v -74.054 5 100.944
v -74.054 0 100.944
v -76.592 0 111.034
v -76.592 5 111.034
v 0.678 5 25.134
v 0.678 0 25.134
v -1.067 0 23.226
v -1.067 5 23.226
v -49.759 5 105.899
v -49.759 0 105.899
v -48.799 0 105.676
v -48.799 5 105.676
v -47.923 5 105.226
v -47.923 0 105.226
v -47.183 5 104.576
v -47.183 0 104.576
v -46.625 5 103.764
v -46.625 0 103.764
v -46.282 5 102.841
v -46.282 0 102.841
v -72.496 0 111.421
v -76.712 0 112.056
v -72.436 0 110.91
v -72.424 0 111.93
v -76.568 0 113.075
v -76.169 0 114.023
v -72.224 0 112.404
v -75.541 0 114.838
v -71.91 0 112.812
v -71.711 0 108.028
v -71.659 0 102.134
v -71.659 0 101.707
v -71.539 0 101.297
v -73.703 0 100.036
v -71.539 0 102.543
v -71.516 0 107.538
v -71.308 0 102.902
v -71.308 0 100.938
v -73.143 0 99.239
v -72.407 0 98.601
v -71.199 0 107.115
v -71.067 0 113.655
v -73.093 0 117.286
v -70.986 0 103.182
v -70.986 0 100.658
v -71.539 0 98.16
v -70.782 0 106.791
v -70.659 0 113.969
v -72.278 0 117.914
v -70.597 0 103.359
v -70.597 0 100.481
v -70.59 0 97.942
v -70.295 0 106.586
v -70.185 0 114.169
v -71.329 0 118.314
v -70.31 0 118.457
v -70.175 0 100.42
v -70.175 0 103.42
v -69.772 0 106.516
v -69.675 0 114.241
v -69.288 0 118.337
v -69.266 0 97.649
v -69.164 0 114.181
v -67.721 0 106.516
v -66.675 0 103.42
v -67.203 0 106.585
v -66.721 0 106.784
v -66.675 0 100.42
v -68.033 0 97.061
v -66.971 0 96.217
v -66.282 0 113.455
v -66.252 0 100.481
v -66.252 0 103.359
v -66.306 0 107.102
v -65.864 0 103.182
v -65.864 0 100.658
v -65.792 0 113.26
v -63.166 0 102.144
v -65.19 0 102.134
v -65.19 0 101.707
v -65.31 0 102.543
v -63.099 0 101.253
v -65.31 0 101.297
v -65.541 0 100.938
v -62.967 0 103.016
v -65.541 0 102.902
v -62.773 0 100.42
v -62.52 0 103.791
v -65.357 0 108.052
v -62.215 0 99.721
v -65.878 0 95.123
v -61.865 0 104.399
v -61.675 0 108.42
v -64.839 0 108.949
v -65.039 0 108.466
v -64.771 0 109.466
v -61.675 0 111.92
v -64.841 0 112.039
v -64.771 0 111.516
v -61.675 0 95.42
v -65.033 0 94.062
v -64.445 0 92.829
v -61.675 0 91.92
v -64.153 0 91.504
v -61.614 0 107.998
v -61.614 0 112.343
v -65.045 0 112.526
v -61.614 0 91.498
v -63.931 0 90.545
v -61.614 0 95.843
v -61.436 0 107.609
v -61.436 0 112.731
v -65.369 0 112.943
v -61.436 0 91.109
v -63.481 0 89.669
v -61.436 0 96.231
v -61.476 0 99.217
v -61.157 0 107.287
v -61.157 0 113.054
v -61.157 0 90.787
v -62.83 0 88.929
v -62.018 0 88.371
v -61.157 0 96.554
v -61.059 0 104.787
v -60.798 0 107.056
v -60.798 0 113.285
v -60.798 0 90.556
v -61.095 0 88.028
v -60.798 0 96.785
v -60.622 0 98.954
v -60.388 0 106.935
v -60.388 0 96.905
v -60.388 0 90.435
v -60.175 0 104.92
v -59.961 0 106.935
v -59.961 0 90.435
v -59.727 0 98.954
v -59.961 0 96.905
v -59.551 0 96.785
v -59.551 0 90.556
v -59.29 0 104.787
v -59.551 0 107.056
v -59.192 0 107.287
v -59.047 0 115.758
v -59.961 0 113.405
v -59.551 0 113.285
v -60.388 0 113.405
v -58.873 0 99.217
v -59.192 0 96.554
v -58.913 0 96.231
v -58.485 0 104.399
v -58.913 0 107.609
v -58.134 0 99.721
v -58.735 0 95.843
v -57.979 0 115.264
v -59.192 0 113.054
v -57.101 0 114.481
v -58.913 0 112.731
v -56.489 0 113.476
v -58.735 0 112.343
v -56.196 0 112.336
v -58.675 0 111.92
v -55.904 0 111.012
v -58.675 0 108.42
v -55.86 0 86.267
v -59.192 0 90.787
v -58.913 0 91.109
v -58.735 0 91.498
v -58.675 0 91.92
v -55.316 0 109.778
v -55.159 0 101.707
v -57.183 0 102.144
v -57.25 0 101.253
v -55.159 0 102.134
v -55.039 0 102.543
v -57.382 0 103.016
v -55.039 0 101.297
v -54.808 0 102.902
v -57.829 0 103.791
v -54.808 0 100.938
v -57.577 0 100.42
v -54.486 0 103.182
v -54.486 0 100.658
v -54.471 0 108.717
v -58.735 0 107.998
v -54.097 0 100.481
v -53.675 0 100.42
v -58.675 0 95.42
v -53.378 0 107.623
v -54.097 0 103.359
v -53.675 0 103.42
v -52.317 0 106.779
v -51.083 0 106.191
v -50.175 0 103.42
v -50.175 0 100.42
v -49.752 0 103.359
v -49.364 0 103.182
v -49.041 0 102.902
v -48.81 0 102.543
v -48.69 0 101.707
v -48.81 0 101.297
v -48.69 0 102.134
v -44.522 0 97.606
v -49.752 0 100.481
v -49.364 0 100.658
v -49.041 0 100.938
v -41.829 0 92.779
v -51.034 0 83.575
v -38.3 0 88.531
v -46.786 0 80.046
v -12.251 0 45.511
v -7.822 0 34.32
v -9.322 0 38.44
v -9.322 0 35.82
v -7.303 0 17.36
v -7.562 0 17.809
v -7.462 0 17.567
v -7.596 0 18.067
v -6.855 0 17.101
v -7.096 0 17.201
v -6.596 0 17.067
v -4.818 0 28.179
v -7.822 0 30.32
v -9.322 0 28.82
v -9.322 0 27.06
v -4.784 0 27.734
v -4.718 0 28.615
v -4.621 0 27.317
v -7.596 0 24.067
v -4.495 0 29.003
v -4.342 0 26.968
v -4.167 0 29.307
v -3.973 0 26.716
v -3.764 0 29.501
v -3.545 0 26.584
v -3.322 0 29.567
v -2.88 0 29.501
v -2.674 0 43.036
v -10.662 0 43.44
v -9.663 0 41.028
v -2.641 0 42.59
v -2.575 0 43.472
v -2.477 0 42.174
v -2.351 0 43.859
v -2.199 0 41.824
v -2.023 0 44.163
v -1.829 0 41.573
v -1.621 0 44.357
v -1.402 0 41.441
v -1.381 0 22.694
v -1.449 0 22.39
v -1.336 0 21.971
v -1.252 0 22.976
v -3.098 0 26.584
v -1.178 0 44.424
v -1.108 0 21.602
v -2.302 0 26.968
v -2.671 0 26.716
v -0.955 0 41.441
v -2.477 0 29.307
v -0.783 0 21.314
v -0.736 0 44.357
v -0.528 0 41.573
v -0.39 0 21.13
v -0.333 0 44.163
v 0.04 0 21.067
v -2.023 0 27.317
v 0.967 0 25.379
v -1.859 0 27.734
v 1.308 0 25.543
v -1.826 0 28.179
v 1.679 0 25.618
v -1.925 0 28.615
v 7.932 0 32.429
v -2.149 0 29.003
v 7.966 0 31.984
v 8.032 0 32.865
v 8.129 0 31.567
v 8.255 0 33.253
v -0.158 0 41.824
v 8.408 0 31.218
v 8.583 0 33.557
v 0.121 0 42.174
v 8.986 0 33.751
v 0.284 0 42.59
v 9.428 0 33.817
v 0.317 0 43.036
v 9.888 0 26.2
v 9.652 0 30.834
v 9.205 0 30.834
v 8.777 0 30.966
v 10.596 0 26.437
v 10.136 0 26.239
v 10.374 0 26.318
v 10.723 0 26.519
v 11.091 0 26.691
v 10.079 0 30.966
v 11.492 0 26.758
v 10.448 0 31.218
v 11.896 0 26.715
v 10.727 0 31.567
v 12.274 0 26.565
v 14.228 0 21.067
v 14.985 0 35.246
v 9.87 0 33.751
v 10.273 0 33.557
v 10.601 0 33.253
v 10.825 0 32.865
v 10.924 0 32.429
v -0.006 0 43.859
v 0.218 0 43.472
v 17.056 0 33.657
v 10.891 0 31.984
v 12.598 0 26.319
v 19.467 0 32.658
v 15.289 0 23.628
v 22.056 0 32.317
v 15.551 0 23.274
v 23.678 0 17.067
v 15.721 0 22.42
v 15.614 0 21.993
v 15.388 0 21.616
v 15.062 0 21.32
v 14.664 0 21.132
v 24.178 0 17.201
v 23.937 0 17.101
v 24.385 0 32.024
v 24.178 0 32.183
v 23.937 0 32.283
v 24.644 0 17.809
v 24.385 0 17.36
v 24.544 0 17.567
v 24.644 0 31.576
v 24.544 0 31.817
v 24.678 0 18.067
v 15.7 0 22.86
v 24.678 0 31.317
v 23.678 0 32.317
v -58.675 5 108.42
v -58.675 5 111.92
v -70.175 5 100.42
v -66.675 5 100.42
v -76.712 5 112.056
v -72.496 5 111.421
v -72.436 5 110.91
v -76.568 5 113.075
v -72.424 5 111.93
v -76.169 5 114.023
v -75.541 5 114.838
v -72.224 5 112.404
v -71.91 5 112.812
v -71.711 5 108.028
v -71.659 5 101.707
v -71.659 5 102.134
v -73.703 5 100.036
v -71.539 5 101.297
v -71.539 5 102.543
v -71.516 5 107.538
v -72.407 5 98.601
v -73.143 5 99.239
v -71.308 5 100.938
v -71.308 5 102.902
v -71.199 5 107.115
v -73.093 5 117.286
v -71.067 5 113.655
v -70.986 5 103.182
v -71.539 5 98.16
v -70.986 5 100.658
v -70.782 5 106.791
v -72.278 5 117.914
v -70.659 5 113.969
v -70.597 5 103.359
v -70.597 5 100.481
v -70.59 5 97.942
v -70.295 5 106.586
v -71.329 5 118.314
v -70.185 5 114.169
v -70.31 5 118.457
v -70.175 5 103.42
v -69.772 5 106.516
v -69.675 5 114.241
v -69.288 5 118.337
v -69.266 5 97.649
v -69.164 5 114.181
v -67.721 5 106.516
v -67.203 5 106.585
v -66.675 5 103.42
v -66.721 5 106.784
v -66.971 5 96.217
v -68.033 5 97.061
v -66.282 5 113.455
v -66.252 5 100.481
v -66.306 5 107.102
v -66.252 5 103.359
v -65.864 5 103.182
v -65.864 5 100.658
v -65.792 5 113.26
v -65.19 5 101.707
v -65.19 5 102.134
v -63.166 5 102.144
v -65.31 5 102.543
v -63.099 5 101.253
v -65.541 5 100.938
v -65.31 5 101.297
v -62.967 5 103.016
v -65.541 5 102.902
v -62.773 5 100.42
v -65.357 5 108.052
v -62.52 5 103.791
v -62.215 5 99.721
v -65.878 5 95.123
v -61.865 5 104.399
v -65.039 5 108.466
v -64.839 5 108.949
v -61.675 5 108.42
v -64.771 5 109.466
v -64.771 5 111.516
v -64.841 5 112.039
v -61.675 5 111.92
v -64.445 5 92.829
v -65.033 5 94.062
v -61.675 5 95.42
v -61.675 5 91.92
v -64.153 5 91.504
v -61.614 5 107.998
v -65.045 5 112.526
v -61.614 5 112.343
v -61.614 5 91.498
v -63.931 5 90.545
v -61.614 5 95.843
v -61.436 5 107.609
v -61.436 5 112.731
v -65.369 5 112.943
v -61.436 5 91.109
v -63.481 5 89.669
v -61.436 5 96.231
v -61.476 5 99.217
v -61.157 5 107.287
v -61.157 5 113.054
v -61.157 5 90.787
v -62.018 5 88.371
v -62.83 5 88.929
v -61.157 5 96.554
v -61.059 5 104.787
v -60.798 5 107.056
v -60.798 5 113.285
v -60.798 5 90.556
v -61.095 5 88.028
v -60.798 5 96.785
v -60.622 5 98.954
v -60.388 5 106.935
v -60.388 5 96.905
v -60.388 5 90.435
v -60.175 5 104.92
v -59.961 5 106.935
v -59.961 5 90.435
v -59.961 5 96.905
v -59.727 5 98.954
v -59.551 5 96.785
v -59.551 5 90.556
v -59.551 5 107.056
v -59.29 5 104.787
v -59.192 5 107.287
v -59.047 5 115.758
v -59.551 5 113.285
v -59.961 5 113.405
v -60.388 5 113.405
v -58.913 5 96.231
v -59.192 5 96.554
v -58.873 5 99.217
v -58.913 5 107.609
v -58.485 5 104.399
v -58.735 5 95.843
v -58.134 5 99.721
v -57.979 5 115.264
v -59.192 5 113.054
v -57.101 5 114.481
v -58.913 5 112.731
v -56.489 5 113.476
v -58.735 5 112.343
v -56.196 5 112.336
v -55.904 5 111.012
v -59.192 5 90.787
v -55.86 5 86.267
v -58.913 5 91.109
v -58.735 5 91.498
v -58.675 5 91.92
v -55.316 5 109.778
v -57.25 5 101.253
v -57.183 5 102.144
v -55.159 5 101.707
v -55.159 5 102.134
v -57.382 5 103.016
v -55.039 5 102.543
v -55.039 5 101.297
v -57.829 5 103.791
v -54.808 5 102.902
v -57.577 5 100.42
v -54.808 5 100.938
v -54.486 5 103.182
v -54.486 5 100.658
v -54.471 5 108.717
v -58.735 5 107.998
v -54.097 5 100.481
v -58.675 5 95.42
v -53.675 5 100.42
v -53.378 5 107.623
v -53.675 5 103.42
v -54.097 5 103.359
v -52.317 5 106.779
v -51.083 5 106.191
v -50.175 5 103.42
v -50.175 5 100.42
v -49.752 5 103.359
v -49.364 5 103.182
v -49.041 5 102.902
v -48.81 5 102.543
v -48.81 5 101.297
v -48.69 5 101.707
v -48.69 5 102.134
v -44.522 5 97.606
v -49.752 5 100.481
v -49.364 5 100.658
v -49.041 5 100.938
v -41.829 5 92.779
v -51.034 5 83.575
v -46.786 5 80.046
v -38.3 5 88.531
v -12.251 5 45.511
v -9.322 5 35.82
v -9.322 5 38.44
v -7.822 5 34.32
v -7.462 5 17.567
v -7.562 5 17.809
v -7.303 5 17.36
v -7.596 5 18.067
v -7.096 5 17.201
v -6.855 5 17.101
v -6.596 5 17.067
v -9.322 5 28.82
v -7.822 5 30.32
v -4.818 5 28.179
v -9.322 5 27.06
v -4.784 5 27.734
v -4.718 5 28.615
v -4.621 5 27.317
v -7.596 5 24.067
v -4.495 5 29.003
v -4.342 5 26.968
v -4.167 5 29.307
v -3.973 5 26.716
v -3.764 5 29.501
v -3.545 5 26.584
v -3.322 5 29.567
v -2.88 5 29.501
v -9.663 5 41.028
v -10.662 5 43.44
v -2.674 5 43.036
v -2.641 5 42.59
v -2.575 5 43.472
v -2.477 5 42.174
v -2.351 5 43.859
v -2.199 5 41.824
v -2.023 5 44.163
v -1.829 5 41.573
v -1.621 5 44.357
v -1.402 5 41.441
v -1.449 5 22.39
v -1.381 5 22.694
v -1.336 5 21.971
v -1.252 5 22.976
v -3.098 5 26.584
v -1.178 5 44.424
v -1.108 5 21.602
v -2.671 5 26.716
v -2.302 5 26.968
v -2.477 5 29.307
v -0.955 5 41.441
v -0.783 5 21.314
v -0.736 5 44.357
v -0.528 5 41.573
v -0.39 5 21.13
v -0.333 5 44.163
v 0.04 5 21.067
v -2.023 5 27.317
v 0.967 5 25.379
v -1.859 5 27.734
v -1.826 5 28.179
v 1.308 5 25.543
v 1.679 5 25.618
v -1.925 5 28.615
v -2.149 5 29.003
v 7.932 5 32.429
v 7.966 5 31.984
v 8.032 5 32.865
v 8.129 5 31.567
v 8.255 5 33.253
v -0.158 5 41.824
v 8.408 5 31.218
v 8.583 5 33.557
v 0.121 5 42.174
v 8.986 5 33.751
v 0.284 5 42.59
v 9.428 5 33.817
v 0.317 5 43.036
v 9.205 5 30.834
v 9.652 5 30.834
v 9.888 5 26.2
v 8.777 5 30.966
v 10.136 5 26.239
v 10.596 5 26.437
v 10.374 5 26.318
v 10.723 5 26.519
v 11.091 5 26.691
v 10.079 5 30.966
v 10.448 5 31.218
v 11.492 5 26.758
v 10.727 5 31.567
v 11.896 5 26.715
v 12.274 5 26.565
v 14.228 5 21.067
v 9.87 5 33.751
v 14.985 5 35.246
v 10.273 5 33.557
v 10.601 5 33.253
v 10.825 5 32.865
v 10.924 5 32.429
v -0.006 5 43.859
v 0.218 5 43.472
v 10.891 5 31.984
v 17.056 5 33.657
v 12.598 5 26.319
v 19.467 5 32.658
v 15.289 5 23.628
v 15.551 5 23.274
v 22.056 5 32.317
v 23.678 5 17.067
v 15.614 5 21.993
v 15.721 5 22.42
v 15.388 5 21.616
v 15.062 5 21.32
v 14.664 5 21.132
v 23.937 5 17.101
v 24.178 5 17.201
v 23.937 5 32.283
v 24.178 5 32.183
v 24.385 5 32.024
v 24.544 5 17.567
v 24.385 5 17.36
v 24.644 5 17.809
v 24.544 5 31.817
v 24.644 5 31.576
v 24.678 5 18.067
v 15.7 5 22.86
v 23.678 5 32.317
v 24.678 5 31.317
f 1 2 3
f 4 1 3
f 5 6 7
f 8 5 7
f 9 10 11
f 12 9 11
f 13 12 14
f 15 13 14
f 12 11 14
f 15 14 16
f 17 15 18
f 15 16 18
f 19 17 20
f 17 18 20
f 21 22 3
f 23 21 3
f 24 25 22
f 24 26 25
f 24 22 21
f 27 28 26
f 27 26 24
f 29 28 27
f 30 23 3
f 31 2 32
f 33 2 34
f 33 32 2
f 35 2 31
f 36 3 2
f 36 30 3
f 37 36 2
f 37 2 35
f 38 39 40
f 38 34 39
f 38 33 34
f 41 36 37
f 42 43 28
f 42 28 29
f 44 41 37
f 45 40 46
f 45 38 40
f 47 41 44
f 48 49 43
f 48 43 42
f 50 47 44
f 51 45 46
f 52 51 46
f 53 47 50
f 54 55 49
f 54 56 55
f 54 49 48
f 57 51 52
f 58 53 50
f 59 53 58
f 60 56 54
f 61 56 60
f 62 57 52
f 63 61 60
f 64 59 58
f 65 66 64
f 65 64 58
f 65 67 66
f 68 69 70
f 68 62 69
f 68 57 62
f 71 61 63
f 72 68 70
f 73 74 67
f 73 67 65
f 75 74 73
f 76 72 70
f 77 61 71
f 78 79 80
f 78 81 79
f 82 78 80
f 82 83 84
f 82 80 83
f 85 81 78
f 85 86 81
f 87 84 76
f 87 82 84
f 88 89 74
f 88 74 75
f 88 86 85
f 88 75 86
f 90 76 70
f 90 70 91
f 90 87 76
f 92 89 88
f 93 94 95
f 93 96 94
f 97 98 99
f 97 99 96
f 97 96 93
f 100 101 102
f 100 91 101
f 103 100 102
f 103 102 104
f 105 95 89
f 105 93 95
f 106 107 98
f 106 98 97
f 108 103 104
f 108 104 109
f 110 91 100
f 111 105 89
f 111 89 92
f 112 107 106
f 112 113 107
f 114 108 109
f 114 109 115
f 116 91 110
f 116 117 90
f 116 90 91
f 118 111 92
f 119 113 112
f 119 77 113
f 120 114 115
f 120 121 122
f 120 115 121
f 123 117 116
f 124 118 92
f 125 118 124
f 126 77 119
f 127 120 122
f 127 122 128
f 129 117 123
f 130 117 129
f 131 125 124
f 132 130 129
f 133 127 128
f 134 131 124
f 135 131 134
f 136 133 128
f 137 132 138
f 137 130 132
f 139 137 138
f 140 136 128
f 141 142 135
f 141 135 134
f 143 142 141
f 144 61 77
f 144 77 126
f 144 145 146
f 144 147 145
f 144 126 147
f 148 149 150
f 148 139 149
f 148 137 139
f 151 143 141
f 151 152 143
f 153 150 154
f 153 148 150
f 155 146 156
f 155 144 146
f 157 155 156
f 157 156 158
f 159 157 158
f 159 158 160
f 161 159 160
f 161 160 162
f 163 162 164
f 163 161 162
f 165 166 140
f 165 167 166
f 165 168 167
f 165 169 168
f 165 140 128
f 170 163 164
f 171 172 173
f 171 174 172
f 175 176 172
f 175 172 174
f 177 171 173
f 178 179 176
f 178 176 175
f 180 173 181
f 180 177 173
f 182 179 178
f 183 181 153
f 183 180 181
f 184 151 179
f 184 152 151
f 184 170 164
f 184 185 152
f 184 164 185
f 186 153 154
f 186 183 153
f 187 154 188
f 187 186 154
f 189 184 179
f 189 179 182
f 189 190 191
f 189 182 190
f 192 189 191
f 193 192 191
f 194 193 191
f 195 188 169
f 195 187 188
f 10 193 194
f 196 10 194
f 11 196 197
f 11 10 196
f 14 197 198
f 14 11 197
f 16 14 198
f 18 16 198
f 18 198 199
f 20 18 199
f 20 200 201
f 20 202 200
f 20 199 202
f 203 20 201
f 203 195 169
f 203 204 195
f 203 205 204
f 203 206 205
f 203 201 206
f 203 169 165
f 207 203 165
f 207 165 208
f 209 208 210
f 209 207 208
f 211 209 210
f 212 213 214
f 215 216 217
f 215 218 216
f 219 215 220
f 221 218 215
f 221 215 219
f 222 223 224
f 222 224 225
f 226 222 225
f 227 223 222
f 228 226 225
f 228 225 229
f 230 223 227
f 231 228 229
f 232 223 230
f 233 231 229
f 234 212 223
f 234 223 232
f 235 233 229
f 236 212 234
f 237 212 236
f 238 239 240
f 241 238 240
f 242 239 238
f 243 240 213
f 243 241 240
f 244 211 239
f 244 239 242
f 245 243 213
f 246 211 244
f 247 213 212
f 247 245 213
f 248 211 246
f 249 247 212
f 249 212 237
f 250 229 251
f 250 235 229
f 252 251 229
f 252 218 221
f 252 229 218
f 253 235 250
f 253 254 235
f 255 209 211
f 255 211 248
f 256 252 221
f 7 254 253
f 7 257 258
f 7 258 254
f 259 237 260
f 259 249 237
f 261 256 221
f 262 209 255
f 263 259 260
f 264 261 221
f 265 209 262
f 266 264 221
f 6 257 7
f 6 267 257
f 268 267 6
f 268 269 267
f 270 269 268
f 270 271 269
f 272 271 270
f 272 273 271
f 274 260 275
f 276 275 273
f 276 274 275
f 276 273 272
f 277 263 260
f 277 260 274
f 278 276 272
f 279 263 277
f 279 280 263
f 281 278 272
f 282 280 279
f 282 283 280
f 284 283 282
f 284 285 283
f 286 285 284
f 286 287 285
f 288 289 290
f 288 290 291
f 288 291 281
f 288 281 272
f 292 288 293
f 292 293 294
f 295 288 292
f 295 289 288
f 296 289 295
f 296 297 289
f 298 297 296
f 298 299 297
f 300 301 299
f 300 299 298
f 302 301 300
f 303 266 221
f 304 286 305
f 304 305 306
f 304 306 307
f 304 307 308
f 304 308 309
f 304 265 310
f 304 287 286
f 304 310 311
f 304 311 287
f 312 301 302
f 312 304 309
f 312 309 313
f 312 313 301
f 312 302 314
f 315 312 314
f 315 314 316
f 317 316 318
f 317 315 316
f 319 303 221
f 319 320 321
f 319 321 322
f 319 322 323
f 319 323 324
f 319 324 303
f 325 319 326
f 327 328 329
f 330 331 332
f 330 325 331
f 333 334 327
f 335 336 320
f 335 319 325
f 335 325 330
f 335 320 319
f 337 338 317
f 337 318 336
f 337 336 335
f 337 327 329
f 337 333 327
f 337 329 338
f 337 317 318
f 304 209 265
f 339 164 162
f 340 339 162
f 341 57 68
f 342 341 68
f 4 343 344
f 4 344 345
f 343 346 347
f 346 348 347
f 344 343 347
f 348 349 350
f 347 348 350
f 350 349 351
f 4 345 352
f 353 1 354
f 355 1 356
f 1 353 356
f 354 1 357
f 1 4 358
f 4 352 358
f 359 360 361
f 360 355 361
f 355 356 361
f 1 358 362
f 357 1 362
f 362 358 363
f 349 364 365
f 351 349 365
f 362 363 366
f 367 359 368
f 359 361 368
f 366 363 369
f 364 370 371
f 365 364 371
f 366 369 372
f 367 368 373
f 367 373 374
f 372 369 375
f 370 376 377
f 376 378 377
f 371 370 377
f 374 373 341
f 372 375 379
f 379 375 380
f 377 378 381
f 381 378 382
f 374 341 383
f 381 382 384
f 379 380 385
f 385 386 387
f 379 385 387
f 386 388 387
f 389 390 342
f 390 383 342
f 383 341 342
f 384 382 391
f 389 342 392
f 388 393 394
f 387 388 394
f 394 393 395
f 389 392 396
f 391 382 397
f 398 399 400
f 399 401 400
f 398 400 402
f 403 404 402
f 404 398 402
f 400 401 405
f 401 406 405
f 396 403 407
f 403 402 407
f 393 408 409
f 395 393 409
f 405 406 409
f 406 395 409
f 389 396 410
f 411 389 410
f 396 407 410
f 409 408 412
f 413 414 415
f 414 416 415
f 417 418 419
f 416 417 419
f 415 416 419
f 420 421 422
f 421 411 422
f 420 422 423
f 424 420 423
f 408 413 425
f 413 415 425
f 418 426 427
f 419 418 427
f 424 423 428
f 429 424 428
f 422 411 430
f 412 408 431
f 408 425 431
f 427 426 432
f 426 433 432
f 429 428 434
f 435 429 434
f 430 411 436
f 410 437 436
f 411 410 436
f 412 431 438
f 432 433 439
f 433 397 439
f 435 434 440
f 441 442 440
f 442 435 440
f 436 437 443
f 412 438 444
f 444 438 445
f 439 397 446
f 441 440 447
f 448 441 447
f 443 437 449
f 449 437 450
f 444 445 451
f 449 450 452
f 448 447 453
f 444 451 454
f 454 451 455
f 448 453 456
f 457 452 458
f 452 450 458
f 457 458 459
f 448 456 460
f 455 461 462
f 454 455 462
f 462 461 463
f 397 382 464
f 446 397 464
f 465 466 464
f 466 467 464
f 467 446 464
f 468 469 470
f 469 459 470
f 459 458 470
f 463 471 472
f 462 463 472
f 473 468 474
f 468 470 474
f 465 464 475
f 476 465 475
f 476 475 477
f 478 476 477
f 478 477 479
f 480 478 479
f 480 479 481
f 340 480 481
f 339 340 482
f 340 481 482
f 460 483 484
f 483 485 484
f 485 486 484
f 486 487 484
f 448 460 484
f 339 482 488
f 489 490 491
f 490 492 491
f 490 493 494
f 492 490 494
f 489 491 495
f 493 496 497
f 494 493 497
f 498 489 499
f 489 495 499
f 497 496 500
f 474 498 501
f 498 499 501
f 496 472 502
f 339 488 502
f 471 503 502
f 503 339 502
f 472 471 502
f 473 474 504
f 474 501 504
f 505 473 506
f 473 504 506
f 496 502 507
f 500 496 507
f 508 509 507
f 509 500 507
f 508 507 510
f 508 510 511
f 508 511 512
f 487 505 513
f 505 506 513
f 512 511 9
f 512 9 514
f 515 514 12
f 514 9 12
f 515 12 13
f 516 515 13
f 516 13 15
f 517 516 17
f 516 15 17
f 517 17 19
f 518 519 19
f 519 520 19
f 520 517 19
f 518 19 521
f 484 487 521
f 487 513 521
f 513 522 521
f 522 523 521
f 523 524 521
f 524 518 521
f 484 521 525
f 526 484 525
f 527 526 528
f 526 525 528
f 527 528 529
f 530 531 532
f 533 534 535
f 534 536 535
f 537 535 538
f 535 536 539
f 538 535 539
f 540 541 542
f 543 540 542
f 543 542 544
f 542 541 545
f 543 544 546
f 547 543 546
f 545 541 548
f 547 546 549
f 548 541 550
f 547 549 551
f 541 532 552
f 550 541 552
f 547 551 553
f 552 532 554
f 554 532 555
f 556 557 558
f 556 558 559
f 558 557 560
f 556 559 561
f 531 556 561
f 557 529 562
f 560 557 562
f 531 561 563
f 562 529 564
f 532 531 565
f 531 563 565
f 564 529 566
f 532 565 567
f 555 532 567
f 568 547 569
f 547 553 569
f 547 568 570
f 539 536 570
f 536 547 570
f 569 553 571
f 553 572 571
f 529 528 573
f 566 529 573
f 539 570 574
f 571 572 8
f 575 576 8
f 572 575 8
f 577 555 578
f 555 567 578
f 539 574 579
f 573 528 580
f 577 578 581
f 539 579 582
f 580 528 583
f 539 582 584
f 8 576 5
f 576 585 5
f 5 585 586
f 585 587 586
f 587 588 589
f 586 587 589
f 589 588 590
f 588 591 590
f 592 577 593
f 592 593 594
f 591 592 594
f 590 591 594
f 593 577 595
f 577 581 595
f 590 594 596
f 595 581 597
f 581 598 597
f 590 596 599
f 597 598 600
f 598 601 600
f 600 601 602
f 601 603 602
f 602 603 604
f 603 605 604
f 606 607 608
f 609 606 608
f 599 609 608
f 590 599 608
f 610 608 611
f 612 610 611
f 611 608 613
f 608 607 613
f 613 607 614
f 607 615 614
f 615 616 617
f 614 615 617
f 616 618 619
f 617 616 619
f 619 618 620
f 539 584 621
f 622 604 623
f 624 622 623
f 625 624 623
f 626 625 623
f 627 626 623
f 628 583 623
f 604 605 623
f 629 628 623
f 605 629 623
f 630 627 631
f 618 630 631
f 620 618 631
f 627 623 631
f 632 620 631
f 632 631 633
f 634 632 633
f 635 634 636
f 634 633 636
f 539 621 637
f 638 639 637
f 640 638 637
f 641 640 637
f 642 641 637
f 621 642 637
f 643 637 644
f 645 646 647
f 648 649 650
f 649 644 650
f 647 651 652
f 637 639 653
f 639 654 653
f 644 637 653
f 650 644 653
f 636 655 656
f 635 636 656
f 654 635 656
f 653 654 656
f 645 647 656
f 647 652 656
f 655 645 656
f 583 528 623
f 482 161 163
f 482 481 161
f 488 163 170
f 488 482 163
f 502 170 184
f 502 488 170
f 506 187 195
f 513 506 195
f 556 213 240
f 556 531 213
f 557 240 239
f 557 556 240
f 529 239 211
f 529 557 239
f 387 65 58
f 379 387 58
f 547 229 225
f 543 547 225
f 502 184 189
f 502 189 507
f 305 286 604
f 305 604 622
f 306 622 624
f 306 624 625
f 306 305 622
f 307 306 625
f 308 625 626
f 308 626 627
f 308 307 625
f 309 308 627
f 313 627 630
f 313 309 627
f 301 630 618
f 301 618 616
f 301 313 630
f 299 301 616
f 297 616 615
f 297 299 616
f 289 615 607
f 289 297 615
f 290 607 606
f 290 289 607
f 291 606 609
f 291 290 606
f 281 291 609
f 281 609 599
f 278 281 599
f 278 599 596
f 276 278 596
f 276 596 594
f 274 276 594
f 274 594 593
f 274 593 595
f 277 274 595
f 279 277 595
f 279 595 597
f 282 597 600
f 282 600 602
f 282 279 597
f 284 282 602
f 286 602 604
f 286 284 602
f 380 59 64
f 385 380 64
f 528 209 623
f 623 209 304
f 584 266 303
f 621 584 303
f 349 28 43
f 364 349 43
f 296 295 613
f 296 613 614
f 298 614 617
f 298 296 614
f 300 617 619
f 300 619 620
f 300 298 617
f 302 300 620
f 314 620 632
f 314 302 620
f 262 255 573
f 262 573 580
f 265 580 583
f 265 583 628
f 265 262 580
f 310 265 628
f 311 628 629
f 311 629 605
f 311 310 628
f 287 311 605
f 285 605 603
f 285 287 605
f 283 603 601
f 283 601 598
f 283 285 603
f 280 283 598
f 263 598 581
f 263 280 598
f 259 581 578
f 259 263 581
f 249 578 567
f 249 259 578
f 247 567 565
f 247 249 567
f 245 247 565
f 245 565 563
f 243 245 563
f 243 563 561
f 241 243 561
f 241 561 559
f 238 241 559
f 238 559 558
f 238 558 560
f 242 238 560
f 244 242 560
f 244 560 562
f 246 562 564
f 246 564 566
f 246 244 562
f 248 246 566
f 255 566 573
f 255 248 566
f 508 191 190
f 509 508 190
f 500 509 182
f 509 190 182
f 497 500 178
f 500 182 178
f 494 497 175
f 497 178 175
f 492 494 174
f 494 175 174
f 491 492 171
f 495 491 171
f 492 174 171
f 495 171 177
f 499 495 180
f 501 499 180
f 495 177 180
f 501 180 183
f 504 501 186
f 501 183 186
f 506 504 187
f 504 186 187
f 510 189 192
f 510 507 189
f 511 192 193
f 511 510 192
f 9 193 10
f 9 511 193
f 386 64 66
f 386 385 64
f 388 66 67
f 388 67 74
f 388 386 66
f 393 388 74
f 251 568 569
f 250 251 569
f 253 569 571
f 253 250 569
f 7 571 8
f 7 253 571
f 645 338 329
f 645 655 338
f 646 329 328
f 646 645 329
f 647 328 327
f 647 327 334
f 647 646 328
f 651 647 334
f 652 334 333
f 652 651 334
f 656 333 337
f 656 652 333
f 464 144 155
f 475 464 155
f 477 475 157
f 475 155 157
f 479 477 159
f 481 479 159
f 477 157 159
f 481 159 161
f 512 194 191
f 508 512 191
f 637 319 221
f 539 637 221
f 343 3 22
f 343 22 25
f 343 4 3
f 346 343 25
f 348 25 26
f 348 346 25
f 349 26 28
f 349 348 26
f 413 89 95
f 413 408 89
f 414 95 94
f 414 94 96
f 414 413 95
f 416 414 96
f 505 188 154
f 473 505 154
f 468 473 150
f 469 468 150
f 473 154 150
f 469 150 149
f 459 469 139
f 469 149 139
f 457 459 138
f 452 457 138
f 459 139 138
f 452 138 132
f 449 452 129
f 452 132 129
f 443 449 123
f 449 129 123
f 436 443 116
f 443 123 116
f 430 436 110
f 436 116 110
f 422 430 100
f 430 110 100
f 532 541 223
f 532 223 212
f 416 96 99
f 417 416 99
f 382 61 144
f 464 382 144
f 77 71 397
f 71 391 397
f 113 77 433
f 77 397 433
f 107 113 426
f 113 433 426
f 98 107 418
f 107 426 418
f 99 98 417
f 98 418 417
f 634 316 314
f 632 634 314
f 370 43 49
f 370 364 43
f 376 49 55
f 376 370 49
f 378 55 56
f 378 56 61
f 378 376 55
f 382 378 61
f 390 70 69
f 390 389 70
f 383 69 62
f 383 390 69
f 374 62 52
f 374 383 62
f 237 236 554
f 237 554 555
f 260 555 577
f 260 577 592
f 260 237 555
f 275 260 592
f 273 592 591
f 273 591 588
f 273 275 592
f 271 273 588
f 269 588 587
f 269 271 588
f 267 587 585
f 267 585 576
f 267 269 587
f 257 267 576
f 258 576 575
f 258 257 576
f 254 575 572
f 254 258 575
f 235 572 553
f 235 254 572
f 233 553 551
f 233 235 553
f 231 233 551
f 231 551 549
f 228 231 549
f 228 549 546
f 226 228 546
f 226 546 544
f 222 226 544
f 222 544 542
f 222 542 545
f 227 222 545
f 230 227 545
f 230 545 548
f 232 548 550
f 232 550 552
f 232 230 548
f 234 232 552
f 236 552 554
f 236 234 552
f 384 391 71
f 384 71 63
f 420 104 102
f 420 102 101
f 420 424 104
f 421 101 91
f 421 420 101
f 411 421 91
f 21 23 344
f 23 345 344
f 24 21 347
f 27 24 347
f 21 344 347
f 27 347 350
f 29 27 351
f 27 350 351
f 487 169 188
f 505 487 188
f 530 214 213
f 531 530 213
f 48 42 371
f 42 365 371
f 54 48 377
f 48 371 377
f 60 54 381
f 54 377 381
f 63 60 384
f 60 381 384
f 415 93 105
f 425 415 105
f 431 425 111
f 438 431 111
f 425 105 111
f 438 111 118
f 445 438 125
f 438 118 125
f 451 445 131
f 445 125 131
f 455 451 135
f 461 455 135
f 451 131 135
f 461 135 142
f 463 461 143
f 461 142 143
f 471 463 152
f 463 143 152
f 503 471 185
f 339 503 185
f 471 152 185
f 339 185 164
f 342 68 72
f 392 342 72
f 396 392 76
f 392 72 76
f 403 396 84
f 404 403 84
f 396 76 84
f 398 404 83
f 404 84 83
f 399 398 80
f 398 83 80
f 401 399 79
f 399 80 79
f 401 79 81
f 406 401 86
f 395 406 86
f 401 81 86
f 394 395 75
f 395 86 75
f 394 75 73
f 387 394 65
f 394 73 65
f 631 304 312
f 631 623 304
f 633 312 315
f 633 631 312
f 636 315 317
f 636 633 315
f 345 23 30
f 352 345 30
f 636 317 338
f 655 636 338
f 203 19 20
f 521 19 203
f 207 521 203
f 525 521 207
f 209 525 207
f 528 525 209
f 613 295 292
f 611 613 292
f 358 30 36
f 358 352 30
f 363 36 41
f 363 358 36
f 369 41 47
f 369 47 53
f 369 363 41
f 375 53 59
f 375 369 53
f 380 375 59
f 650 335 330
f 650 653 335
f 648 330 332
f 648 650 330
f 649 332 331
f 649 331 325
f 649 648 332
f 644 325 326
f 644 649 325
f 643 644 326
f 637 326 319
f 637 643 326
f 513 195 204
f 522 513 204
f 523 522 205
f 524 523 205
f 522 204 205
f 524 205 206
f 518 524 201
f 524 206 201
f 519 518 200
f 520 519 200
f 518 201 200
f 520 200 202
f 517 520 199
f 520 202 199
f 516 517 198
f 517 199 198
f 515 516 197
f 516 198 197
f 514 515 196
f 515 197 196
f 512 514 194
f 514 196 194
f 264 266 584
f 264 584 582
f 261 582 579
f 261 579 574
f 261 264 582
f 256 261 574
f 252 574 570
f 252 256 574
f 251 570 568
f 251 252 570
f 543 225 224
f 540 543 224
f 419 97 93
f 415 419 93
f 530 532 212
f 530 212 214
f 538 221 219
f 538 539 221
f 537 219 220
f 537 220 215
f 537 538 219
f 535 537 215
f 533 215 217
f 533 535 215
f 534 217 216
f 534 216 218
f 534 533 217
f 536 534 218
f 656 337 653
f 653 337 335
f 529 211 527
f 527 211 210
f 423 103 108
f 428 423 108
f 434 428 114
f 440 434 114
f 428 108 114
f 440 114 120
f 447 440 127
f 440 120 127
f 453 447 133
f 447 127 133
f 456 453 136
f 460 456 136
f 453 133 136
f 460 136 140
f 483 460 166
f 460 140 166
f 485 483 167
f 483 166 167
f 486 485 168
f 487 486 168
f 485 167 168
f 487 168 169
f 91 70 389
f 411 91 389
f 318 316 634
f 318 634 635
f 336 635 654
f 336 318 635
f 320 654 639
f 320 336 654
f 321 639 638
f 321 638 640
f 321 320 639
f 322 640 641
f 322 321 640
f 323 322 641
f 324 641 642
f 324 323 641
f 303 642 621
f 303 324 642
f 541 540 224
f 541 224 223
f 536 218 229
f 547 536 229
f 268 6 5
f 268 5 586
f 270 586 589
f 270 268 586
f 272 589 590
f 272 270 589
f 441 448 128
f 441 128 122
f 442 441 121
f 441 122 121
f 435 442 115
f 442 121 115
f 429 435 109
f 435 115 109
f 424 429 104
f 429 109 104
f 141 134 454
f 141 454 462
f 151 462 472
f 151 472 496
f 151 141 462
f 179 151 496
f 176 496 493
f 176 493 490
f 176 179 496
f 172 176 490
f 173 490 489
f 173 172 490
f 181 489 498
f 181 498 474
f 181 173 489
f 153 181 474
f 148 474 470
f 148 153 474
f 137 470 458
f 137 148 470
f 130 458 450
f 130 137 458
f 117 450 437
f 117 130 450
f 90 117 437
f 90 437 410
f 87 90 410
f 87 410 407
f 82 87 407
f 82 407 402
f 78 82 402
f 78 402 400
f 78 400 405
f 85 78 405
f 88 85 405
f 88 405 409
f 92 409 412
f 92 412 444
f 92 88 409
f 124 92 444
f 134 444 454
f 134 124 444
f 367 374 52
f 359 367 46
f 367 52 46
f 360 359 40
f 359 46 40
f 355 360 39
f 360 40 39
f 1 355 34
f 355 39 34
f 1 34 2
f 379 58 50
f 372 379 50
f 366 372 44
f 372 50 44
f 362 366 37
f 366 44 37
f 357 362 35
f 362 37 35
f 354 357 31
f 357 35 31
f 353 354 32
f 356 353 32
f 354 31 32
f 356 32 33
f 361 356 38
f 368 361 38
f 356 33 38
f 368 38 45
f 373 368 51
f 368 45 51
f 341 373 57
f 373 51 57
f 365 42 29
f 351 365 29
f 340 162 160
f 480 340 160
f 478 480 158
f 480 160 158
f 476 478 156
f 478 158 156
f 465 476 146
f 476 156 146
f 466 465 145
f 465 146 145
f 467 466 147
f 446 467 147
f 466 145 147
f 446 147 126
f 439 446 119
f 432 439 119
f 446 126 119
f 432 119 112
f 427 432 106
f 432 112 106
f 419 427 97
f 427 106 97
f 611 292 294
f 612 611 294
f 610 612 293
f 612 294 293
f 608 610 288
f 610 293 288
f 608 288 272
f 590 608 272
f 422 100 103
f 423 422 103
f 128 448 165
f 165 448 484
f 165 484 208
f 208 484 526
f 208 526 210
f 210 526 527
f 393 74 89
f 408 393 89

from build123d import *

# Parameters (mm, degrees)
SKETCH2_R           = 3.0000000000000018
SKETCH2_R_2         = 1.4999999999993736
SKETCH2_R_3         = 1.5000000000000009
SKETCH2_R_4         = 1.4999999999993723
BOSS_EXTRUDE1_DEPTH = 5
FILLET1_R           = 1.5
FILLET3_R           = 10
FILLET5_R           = 10
CHAMFER1_SIZE       = 4.5
FILLET6_R           = 6
FILLET7_R           = 4
FILLET8_R           = 2
FILLET9_R           = 30
CUT_EXTRUDE1_DEPTH  = 142.21634167657882
FILLET10_R          = 1


with BuildPart() as part:
    # Sketch2 → Boss-Extrude1 (new body)
    with BuildSketch(Plane(origin=(0, 0, 0), x_dir=(1, 0, 0), z_dir=(0, 1, 0))):
        with BuildLine():
            Line((-46.189355852298796, -96.42025186017804), (-39.496927389393186, -89.72782339727232))
            Line((-39.496927389393186, -89.72782339727232), (17.913506363615255, -32.31738964426288))
            Line((17.913506363615255, -32.31738964426288), (24.678224989376695, -32.31738964426288))
            Line((24.678224989376695, -32.31738964426288), (24.678224989376428, -17.06738964426295))
            Line((24.678224989376428, -17.06738964426295), (-7.595965049770856, -17.06738964426337))
            Line((-7.595965049770856, -17.06738964426337), (-7.595965049770857, -24.067389644263372))
            Line((-7.595965049770857, -24.067389644263372), (-9.321775010623746, -27.06012368042446))
            Line((-9.321775010623746, -27.06012368042446), (-9.32177501062375, -37.06738964426337))
            Line((-9.32177501062375, -37.06738964426337), (-9.321775010623757, -42.58210827002507))
            Line((-9.321775010623753, -42.58210827002507), (-54.6598701272448, -87.9202033866469))
            Line((-54.6598701272448, -87.9202033866469), (-60.17458875300816, -87.92020338664692))
            ThreePointArc((-60.17458875300816, -87.92020338664692), (-63.00301587775435, -89.09177626190073), (-64.17458875300817, -91.92020338664692))
            Line((-64.17458875300817, -91.92020338664692), (-64.17458875300817, -97.92020338664689))
            Line((-64.17458875300817, -97.92020338664689), (-70.17458875301077, -97.92020338664689))
            ThreePointArc((-70.17458875301077, -97.92020338664689), (-72.6339398041774, -98.76558892412923), (-74.05374095021992, -100.9444071830841))
            Line((-74.05374095021992, -100.9444071830841), (-77.14515150148509, -113.23391188563446))
            Line((-77.14515150148509, -113.23391188563446), (-71.4882972519927, -118.89076613512684))
            Line((-71.4882972519927, -118.89076613512684), (-59.047429208957894, -115.75810794021132))
            ThreePointArc((-59.047429208957894, -115.75810794021132), (-56.9723521770992, -114.3172183869977), (-56.174588753010745, -111.92020338664949))
            Line((-56.174588753010745, -111.92020338664949), (-56.174588753010745, -105.92020338664949))
            Line((-56.174588753010745, -105.92020338664949), (-50.174588753008145, -105.92020338664949))
            ThreePointArc((-50.174588753008145, -105.92020338664949), (-47.34616162826196, -104.74863051139567), (-46.174588753008145, -101.92020338664949))
            Line((-46.174588753008145, -101.92020338664949), (-46.17464642427909, -101.89872393503671))
            Line((-46.17464642427909, -101.89872393503671), (-46.189355852298796, -96.42025186017804))
        make_face()
        Polygon((-70.26446914062754, -114.4577399969996), (-72.71257361922765, -112.00963551839949), (-71.33075600396296, -106.51639746436214), (-66.89210317428027, -106.51639746436214), (-64.77078283072062, -108.63771780792177), (-64.7707828307206, -113.0744087552009), align=None, mode=Mode.SUBTRACT)
        with BuildLine():
            ThreePointArc((-61.67458875301074, -108.42020338664949), (-60.17458875301075, -106.92020338664949), (-58.67458875301077, -108.42020338664949))
            Line((-58.67458875301077, -108.42020338664949), (-58.674588753010774, -111.92020338664949))
            ThreePointArc((-58.674588753010774, -111.92020338664949), (-60.17458875301075, -113.42020338664946), (-61.67458875301073, -111.92020338664949))
            Line((-61.67458875301073, -111.92020338664949), (-61.67458875301074, -108.42020338664949))
        make_face(mode=Mode.SUBTRACT)
        with BuildLine():
            ThreePointArc((-66.67458875301074, -100.42020338664692), (-65.17458875301071, -101.92020338664692), (-66.67458875301074, -103.42020338664692))
            Line((-66.67458875301074, -103.42020338664692), (-70.17458875301077, -103.42020338664692))
            ThreePointArc((-70.17458875301077, -103.42020338664692), (-71.67458875301075, -101.92020338664692), (-70.17458875301077, -100.42020338664692))
            Line((-70.17458875301077, -100.4202033866469), (-66.67458875301074, -100.4202033866469))
        make_face(mode=Mode.SUBTRACT)
        with Locations(Location((-60.174588753008145, -101.92020338664949, 0), (0, 0, 270))):
            Circle(SKETCH2_R, mode=Mode.SUBTRACT)
        with BuildLine():
            ThreePointArc((-53.67458875300815, -103.42020338664949), (-55.17458875300815, -101.92020338664949), (-53.67458875300815, -100.42020338664949))
            Line((-53.67458875300815, -100.42020338664949), (-50.174588753008145, -100.42020338664949))
            ThreePointArc((-50.174588753008145, -100.42020338664949), (-48.67458875300816, -101.92020338664949), (-50.174588753008145, -103.42020338664949))
            Line((-50.174588753008145, -103.42020338664949), (-53.67458875300815, -103.42020338664949))
        make_face(mode=Mode.SUBTRACT)
        with BuildLine():
            ThreePointArc((-58.67458875300815, -95.42020338664692), (-60.17458875300815, -96.9202033866469), (-61.67458875300815, -95.42020338664692))
            Line((-61.674588753008145, -95.42020338664692), (-61.67458875300816, -91.92020338664692))
            ThreePointArc((-61.67458875300816, -91.92020338664692), (-60.174588753008145, -90.42020338664689), (-58.67458875300813, -91.92020338664692))
            Line((-58.67458875300813, -91.92020338664692), (-58.674588753008145, -95.42020338664692))
        make_face(mode=Mode.SUBTRACT)
        with Locations(Location((-1.1783767284213562, -42.92399136206118, 0), (0, 0, 270))):
            Circle(SKETCH2_R_2, mode=Mode.SUBTRACT)
        with Locations(Location((-3.3217750106237407, -28.067389644263372, 0), (0, 0, 270))):
            Circle(SKETCH2_R_3, mode=Mode.SUBTRACT)
        with Locations(Location((9.428224989376764, -32.31738964426288, 0), (0, 0, 270))):
            Circle(SKETCH2_R_4, mode=Mode.SUBTRACT)
        Polygon((1.0820753752795897, -25.575281589539195), (-1.459873180493811, -22.79599601598655), (-1.4598731804937872, -21.06738964426295), (17.849797864630506, -21.06738964426295), (11.740910030340089, -27.17627747855337), (10.272484798754686, -26.22755837455273), align=None, mode=Mode.SUBTRACT)
    extrude(amount=BOSS_EXTRUDE1_DEPTH)

    # Fillet1
    # the kernel refuses this fillet: 1.5 mm, written as the material it adds along each edge
    with BuildSketch(Plane(origin=(1.0820753752795897, 0, 25.575281589539195), x_dir=(0.9974908468725838, 0, 0.07079555357093803), z_dir=(0, 1, 0))) as fillet1_piece_1:
        with BuildLine():
            CenterArc((FILLET1_R * 0.398900109333, FILLET1_R), FILLET1_R, 226.50587582859146, 43.4941241714086)
            Line((-FILLET1_R * 0.289380073746, FILLET1_R * 0.274555040282), (0, 0))
            Line((0, 0), (FILLET1_R * 0.398900109333, 0))
        make_face()
    extrude(amount=5)
    with BuildSketch(Plane(origin=(-1.459873180493811, 0, 22.79599601598655), x_dir=(1.372e-14, 0, -1), z_dir=(0, 1, 0))) as fillet1_piece_2:
        with BuildLine():
            CenterArc((FILLET1_R * 0.388338270451, -FILLET1_R), FILLET1_R, 89.99999999999997, 42.44619337739144)
            Line((-FILLET1_R * 0.286559260205, -FILLET1_R * 0.262088539786), (0, 0))
            Line((0, 0), (FILLET1_R * 0.388338270451, 0))
        make_face()
    extrude(amount=5)
    with BuildSketch(Plane(origin=(-1.459873180493787, 0, 21.06738964426295), x_dir=(1, 0, 0), z_dir=(0, 1, 0))) as fillet1_piece_3:
        with BuildLine():
            CenterArc((FILLET1_R, -FILLET1_R), FILLET1_R, 90, 89.99999999999918)
            Line((-2.087e-14, -FILLET1_R), (0, 0))
            Line((0, 0), (FILLET1_R, 0))
        make_face()
    extrude(amount=5)
    with BuildSketch(Plane(origin=(11.740910030340089, 0, 27.17627747855337), x_dir=(-0.839945220222329, 0, -0.5426711960530642), z_dir=(0, 1, 0))) as fillet1_piece_4:
        with BuildLine():
            CenterArc((FILLET1_R * 0.807844840446, -FILLET1_R), FILLET1_R, 89.99999999999994, 77.86566453571226)
            Line((-FILLET1_R * 0.169812603282, -FILLET1_R * 0.789795521639), (0, 0))
            Line((0, 0), (FILLET1_R * 0.807844840446, -3e-17))
        make_face()
    extrude(amount=5)
    with BuildSketch(Plane(origin=(17.849797864630506, 0, 21.06738964426295), x_dir=(-0.7071067811865475, 0, 0.7071067811865475), z_dir=(0, 1, 0))) as fillet1_piece_5:
        with BuildLine():
            CenterArc((FILLET1_R * 2.41421356237, -FILLET1_R), FILLET1_R, 89.99999999999994, 135.00000000000006)
            Line((FILLET1_R * 1.70710678119, -FILLET1_R * 1.70710678119), (0, 0))
            Line((0, 0), (FILLET1_R * 2.41421356237, 1e-17))
        make_face()
    extrude(amount=5)
    # the kernel refuses this fillet: 1.5 mm, written as the material it takes off along each edge
    with BuildSketch(Plane(origin=(10.27248479875469, -0.9630450228974294, 26.22755837455273), x_dir=(0.8399452202223279, 0, 0.5426711960530661), z_dir=(0, 1, 0))) as fillet1_2_piece_1:
        with BuildLine():
            CenterArc((FILLET1_R * 0.256812006106, -FILLET1_R), FILLET1_R, 90.00000000000006, 28.805982084511456)
            Line((-FILLET1_R * 0.225033157983, -FILLET1_R * 0.123743623222), (0, 0))
            Line((0, 0), (FILLET1_R * 0.256812006106, 2e-17))
        make_face()
    extrude(amount=6.92609004579486, mode=Mode.SUBTRACT)

    # Fillet3
    fillet3_edges = [part.edges().sort_by_distance(p)[0] for p in [
        (17.913506363615255, 2.5, 32.31738964426288),
    ]]
    fillet(fillet3_edges, radius=FILLET3_R)

    # Fillet5
    fillet5_edges = [part.edges().sort_by_distance(p)[0] for p in [
        (-9.321775010623755, 2.5, 42.58210827002507),
    ]]
    fillet(fillet5_edges, radius=FILLET5_R)

    # Chamfer1
    chamfer1_edges = [part.edges().sort_by_distance(p)[0] for p in [
        (-64.17458875300817, 2.5, 97.92020338664689),
        (-56.174588753010745, 2.5, 105.92020338664949),
    ]]
    chamfer(chamfer1_edges, length=CHAMFER1_SIZE)

    # Fillet6
    fillet6_edges = [part.edges().sort_by_distance(p)[0] for p in [
        (-64.17458875300817, 2.5, 93.42020338664689),
        (-68.67458875300817, 2.5, 97.92020338664689),
        (-56.174588753010745, 2.5, 110.42020338664949),
        (-51.674588753010745, 2.5, 105.92020338664949),
    ]]
    fillet(fillet6_edges, radius=FILLET6_R)

    # Fillet7
    fillet7_edges = [part.edges().sort_by_distance(p)[0] for p in [
        (-71.4882972519927, 2.5, 118.89076613512684),
        (-77.14515150148509, 2.5, 113.23391188563446),
    ]]
    fillet(fillet7_edges, radius=FILLET7_R)

    # Fillet8
    fillet8_edges = [part.edges().sort_by_distance(p)[0] for p in [
        (-72.71257361922765, 2.5, 112.00963551839949),
        (-70.26446914062754, 2.5, 114.4577399969996),
        (-64.7707828307206, 2.5, 113.0744087552009),
        (-64.77078283072062, 2.5, 108.63771780792177),
        (-66.89210317428027, 2.5, 106.51639746436214),
        (-71.33075600396296, 2.5, 106.51639746436214),
    ]]
    fillet(fillet8_edges, radius=FILLET8_R)

    # Fillet9
    fillet9_edges = [part.edges().sort_by_distance(p)[0] for p in [
        (-54.6598701272448, 2.5, 87.9202033866469),
        (-46.189355852298796, 2.5, 96.42025186017804),
    ]]
    fillet(fillet9_edges, radius=FILLET9_R)

    # Sketch4 → Cut-Extrude1 (cut, through all)
    with BuildSketch(Plane(origin=(0, 5, 0), x_dir=(1, 0, 0), z_dir=(0, 1, 0))):
        Polygon((-9.321775010623751, -28.81997264629415), (-7.82177501062375, -30.31997264629416), (-7.821775010623751, -34.31997264629416), (-9.321775010623751, -35.819972646294175), align=None)
    extrude(amount=-CUT_EXTRUDE1_DEPTH, mode=Mode.SUBTRACT)

    # Fillet10
    fillet10_edges = [part.edges().sort_by_distance(p)[0] for p in [
        (-7.595965049770856, 2.5, 17.06738964426337),
        (24.678224989376428, 2.5, 17.06738964426295),
        (24.678224989376695, 2.5, 32.31738964426288),
    ]]
    fillet(fillet10_edges, radius=FILLET10_R)


solid = part.part
